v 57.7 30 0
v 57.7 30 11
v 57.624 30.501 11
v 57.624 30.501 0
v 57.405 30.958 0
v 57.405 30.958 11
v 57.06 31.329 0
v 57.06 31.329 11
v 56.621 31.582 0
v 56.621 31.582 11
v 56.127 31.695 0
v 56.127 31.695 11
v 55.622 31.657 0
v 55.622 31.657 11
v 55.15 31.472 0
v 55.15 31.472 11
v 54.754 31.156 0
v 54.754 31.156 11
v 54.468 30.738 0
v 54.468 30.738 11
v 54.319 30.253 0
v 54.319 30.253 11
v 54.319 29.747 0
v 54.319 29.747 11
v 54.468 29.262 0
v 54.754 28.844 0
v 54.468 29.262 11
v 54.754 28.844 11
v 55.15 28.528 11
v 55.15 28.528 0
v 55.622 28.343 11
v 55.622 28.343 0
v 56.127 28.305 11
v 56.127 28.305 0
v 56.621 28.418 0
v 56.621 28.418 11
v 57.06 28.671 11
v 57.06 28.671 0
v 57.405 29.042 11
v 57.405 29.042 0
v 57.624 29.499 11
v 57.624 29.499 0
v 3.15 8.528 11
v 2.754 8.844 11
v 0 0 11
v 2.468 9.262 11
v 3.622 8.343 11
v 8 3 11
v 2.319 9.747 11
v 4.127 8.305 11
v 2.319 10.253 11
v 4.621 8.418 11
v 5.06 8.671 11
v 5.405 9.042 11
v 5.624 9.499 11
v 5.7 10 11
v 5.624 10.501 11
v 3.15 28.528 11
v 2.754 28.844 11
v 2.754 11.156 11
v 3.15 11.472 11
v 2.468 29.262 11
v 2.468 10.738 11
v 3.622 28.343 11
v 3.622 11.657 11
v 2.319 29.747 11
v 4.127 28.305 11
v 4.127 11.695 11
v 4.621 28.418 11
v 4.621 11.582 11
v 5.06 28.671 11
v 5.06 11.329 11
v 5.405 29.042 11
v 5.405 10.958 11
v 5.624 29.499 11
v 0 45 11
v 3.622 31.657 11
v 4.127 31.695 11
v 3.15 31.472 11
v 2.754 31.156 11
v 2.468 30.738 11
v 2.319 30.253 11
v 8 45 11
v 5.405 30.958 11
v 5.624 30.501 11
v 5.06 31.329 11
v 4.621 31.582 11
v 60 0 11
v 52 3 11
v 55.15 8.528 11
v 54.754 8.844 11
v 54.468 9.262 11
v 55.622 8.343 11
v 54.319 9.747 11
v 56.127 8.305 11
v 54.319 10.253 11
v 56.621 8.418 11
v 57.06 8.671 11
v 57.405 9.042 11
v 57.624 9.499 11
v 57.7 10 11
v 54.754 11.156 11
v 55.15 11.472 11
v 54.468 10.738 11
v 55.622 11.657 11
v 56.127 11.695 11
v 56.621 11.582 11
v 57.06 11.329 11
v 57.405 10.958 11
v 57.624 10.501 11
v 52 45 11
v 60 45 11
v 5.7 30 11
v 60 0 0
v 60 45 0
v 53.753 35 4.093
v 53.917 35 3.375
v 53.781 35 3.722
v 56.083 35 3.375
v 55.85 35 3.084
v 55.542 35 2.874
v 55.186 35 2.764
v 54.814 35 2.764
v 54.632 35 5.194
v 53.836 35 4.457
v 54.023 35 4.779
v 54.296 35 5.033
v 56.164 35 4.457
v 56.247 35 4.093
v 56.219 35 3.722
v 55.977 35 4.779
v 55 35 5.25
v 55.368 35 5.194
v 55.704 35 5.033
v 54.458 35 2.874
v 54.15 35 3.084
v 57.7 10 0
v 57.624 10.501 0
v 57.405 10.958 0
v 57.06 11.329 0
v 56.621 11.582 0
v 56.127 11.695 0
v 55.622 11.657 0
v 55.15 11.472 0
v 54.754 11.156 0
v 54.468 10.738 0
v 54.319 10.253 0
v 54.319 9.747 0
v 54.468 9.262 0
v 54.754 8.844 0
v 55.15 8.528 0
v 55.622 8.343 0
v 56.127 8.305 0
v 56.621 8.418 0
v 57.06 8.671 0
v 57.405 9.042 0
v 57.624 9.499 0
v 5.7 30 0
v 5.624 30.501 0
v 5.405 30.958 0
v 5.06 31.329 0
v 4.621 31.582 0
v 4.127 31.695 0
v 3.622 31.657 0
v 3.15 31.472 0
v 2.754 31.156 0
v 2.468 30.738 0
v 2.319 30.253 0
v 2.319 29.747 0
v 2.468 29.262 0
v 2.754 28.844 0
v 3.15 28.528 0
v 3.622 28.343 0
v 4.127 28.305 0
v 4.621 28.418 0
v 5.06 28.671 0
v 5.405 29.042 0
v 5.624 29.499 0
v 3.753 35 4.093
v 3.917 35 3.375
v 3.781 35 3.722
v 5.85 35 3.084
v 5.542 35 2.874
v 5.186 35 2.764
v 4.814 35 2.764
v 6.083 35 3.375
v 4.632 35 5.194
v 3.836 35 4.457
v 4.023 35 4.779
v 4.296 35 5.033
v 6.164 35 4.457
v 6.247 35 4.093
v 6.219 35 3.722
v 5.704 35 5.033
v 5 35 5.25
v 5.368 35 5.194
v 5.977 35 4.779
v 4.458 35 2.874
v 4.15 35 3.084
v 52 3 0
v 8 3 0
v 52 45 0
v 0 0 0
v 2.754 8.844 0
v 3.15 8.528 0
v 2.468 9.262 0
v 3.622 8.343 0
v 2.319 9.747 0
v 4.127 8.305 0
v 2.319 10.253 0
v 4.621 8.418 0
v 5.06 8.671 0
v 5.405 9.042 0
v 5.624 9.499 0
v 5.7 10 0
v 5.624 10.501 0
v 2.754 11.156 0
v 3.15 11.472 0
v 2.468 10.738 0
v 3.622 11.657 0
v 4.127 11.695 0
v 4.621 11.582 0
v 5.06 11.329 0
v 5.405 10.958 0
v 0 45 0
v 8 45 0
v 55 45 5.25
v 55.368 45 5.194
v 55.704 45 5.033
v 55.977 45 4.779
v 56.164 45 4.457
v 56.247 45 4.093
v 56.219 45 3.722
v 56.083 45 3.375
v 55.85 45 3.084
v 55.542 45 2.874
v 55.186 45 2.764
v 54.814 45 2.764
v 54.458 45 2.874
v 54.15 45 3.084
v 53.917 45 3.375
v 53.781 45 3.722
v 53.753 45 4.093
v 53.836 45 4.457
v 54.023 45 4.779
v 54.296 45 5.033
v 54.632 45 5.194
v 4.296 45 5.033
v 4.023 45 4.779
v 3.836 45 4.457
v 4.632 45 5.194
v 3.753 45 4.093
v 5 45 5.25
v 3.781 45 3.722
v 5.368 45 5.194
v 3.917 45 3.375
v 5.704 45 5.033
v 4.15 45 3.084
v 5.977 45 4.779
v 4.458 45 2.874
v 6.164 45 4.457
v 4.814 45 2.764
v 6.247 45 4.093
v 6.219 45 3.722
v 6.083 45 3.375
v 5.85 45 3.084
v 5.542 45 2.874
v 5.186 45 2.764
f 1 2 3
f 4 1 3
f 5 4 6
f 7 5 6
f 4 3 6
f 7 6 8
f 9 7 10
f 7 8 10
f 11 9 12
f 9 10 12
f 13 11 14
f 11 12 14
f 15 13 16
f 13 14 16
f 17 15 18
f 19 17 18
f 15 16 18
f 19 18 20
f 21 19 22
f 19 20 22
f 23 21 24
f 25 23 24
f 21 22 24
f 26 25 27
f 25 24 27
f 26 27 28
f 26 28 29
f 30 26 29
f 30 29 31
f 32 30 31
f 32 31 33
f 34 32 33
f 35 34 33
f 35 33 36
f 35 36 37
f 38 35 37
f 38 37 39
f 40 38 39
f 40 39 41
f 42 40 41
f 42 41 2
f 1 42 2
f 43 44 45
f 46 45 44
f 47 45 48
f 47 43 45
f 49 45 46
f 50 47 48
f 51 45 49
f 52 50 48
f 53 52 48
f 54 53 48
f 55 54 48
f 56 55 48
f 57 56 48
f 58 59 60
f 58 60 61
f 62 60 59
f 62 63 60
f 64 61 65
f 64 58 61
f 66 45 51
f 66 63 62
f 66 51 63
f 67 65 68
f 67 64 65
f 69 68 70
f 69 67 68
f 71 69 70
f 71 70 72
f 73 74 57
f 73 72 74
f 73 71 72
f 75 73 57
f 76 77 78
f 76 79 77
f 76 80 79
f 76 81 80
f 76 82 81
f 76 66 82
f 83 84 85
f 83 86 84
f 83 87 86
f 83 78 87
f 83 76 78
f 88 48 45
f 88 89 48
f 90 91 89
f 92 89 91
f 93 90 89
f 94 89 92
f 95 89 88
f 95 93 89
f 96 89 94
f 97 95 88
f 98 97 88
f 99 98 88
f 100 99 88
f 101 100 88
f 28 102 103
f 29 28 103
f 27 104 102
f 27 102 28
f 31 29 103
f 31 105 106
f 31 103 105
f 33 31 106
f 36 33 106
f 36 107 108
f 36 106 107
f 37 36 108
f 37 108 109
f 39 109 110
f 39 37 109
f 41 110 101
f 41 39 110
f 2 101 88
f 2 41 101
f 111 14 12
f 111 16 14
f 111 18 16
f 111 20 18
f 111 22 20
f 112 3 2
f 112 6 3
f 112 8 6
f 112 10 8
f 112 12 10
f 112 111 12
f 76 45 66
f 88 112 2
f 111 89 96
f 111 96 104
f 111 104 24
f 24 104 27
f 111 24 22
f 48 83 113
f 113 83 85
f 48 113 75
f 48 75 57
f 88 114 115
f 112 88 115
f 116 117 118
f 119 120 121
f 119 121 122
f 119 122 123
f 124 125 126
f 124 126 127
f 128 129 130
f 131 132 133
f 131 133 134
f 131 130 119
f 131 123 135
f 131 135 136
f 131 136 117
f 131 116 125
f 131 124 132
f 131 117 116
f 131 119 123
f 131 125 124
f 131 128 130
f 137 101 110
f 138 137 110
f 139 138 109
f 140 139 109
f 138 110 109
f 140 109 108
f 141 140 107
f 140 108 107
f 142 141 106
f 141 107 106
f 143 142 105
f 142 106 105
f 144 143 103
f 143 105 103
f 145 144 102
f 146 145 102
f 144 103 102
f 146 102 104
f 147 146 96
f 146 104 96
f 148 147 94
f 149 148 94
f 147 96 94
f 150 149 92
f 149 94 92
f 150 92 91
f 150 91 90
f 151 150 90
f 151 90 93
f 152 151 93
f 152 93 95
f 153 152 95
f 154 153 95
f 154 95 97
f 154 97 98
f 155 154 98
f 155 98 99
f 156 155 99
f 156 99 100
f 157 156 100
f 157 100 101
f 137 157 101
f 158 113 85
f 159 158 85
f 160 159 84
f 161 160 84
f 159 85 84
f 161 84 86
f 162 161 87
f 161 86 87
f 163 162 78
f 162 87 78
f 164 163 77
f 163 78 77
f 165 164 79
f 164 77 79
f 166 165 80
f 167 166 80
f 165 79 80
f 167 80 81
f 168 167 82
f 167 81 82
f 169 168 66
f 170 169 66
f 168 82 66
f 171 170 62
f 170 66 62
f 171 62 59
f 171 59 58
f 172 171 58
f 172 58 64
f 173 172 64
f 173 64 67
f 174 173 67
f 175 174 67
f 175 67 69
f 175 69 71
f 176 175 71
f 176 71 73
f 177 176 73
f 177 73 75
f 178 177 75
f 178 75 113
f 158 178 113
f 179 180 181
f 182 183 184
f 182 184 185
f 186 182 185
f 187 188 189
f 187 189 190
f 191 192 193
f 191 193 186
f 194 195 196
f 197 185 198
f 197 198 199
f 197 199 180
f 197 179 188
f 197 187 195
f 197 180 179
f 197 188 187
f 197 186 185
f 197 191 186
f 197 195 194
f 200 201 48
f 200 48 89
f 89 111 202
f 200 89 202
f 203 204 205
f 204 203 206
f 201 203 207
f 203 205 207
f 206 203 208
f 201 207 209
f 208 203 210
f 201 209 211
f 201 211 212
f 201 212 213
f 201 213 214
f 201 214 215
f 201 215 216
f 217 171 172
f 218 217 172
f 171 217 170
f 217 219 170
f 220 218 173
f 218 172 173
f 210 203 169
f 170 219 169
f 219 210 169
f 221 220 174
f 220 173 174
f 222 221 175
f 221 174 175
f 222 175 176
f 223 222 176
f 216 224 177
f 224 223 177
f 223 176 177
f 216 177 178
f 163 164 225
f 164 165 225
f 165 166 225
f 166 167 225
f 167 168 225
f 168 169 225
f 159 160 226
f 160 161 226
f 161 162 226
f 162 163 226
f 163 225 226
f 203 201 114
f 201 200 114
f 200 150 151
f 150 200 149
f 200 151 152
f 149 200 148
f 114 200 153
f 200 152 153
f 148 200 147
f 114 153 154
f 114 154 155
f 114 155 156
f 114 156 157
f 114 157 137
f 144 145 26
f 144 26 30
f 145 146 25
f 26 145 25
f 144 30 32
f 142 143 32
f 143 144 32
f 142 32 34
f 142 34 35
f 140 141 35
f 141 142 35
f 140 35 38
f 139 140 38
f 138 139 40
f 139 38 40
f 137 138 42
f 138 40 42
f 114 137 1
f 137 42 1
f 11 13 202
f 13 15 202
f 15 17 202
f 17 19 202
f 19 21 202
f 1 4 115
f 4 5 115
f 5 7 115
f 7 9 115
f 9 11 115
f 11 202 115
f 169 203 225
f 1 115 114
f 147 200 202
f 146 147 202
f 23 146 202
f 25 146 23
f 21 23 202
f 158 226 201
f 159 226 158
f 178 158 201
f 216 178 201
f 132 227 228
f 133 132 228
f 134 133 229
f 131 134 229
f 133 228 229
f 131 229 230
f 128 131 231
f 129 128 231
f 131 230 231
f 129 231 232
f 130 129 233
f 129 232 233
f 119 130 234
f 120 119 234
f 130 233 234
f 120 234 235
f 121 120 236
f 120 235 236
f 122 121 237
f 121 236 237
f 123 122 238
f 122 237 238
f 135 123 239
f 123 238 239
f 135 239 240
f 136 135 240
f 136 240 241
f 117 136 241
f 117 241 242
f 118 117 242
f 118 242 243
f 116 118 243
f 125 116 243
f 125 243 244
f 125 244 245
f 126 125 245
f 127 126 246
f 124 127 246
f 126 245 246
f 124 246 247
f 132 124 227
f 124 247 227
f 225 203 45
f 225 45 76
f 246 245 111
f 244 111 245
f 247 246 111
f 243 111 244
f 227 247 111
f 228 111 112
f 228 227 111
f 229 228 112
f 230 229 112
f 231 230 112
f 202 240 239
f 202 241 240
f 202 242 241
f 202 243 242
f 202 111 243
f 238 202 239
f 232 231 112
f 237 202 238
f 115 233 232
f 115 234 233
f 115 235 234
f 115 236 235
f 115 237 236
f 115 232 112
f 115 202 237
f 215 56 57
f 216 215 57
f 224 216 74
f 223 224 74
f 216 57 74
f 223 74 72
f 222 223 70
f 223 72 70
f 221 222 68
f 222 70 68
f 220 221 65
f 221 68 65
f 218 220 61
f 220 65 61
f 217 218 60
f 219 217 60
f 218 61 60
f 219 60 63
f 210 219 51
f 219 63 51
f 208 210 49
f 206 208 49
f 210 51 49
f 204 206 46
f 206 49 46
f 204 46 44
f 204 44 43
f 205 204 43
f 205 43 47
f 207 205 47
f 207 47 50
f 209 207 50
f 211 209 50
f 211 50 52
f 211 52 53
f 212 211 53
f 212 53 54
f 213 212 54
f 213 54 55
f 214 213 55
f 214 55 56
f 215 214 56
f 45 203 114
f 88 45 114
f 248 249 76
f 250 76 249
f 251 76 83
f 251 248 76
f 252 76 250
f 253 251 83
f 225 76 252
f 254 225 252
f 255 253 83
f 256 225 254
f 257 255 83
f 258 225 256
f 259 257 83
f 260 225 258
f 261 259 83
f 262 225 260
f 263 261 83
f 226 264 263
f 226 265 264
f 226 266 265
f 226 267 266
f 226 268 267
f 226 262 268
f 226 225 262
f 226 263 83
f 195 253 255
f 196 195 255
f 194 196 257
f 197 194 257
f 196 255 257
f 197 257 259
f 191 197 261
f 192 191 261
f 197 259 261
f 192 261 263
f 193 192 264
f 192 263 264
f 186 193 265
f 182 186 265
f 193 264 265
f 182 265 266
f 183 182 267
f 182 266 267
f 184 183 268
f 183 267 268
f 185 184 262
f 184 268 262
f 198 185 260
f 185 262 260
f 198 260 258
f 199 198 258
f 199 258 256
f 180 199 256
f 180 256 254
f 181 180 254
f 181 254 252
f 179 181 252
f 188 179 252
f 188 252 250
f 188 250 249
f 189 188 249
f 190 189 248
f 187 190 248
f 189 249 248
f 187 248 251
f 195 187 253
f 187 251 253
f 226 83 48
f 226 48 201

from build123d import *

# Parameters (mm, degrees)
SKETCH1_W                  = 60
SKETCH1_H                  = 45
BOSS_EXTRUDE1_DEPTH        = 11
SKETCH3_W                  = 44
SKETCH3_H                  = 11
FAN_DEPTH                  = 42
SKETCH4_R                  = 1.25
SCREWS_DEPTH               = 10
F_3_4_3_4_DIAMETER_HOLE1_D = 3.4


with BuildPart() as part:
    # Sketch1 → Boss-Extrude1 (new body)
    with BuildSketch(Plane.XY):
        with Locations((30, 22.5)):
            Rectangle(SKETCH1_W, SKETCH1_H)
    extrude(amount=BOSS_EXTRUDE1_DEPTH)

    # Sketch3 → fan (cut)
    with BuildSketch(Plane(origin=(0, 45, 0), x_dir=(1, 0, 0), z_dir=(0, 1, 0))):
        with Locations((30, -5.5)):
            Rectangle(SKETCH3_W, SKETCH3_H)
    extrude(amount=-FAN_DEPTH, mode=Mode.SUBTRACT)

    # Sketch4 → screws (cut)
    with BuildSketch(Plane(origin=(0, 45, 0), x_dir=(1, 0, 0), z_dir=(0, 1, 0))):
        with Locations(Location((5, -4, 0), (0, 0, 270))):
            Circle(SKETCH4_R)
        with Locations(Location((55, -4, 0), (0, 0, 270))):
            Circle(SKETCH4_R)
    extrude(amount=-SCREWS_DEPTH, mode=Mode.SUBTRACT)

    # Ø3.4 (3.4) Diameter Hole1 (through all)
    with Locations(Plane(origin=(0, 0, 0), x_dir=(-1, 0, 0), z_dir=(0, 0, -1))):
        with Locations((-4, 30), (-4, 10), (-56, 10), (-56, 30)):
            Hole(F_3_4_3_4_DIAMETER_HOLE1_D / 2)


solid = part.part
